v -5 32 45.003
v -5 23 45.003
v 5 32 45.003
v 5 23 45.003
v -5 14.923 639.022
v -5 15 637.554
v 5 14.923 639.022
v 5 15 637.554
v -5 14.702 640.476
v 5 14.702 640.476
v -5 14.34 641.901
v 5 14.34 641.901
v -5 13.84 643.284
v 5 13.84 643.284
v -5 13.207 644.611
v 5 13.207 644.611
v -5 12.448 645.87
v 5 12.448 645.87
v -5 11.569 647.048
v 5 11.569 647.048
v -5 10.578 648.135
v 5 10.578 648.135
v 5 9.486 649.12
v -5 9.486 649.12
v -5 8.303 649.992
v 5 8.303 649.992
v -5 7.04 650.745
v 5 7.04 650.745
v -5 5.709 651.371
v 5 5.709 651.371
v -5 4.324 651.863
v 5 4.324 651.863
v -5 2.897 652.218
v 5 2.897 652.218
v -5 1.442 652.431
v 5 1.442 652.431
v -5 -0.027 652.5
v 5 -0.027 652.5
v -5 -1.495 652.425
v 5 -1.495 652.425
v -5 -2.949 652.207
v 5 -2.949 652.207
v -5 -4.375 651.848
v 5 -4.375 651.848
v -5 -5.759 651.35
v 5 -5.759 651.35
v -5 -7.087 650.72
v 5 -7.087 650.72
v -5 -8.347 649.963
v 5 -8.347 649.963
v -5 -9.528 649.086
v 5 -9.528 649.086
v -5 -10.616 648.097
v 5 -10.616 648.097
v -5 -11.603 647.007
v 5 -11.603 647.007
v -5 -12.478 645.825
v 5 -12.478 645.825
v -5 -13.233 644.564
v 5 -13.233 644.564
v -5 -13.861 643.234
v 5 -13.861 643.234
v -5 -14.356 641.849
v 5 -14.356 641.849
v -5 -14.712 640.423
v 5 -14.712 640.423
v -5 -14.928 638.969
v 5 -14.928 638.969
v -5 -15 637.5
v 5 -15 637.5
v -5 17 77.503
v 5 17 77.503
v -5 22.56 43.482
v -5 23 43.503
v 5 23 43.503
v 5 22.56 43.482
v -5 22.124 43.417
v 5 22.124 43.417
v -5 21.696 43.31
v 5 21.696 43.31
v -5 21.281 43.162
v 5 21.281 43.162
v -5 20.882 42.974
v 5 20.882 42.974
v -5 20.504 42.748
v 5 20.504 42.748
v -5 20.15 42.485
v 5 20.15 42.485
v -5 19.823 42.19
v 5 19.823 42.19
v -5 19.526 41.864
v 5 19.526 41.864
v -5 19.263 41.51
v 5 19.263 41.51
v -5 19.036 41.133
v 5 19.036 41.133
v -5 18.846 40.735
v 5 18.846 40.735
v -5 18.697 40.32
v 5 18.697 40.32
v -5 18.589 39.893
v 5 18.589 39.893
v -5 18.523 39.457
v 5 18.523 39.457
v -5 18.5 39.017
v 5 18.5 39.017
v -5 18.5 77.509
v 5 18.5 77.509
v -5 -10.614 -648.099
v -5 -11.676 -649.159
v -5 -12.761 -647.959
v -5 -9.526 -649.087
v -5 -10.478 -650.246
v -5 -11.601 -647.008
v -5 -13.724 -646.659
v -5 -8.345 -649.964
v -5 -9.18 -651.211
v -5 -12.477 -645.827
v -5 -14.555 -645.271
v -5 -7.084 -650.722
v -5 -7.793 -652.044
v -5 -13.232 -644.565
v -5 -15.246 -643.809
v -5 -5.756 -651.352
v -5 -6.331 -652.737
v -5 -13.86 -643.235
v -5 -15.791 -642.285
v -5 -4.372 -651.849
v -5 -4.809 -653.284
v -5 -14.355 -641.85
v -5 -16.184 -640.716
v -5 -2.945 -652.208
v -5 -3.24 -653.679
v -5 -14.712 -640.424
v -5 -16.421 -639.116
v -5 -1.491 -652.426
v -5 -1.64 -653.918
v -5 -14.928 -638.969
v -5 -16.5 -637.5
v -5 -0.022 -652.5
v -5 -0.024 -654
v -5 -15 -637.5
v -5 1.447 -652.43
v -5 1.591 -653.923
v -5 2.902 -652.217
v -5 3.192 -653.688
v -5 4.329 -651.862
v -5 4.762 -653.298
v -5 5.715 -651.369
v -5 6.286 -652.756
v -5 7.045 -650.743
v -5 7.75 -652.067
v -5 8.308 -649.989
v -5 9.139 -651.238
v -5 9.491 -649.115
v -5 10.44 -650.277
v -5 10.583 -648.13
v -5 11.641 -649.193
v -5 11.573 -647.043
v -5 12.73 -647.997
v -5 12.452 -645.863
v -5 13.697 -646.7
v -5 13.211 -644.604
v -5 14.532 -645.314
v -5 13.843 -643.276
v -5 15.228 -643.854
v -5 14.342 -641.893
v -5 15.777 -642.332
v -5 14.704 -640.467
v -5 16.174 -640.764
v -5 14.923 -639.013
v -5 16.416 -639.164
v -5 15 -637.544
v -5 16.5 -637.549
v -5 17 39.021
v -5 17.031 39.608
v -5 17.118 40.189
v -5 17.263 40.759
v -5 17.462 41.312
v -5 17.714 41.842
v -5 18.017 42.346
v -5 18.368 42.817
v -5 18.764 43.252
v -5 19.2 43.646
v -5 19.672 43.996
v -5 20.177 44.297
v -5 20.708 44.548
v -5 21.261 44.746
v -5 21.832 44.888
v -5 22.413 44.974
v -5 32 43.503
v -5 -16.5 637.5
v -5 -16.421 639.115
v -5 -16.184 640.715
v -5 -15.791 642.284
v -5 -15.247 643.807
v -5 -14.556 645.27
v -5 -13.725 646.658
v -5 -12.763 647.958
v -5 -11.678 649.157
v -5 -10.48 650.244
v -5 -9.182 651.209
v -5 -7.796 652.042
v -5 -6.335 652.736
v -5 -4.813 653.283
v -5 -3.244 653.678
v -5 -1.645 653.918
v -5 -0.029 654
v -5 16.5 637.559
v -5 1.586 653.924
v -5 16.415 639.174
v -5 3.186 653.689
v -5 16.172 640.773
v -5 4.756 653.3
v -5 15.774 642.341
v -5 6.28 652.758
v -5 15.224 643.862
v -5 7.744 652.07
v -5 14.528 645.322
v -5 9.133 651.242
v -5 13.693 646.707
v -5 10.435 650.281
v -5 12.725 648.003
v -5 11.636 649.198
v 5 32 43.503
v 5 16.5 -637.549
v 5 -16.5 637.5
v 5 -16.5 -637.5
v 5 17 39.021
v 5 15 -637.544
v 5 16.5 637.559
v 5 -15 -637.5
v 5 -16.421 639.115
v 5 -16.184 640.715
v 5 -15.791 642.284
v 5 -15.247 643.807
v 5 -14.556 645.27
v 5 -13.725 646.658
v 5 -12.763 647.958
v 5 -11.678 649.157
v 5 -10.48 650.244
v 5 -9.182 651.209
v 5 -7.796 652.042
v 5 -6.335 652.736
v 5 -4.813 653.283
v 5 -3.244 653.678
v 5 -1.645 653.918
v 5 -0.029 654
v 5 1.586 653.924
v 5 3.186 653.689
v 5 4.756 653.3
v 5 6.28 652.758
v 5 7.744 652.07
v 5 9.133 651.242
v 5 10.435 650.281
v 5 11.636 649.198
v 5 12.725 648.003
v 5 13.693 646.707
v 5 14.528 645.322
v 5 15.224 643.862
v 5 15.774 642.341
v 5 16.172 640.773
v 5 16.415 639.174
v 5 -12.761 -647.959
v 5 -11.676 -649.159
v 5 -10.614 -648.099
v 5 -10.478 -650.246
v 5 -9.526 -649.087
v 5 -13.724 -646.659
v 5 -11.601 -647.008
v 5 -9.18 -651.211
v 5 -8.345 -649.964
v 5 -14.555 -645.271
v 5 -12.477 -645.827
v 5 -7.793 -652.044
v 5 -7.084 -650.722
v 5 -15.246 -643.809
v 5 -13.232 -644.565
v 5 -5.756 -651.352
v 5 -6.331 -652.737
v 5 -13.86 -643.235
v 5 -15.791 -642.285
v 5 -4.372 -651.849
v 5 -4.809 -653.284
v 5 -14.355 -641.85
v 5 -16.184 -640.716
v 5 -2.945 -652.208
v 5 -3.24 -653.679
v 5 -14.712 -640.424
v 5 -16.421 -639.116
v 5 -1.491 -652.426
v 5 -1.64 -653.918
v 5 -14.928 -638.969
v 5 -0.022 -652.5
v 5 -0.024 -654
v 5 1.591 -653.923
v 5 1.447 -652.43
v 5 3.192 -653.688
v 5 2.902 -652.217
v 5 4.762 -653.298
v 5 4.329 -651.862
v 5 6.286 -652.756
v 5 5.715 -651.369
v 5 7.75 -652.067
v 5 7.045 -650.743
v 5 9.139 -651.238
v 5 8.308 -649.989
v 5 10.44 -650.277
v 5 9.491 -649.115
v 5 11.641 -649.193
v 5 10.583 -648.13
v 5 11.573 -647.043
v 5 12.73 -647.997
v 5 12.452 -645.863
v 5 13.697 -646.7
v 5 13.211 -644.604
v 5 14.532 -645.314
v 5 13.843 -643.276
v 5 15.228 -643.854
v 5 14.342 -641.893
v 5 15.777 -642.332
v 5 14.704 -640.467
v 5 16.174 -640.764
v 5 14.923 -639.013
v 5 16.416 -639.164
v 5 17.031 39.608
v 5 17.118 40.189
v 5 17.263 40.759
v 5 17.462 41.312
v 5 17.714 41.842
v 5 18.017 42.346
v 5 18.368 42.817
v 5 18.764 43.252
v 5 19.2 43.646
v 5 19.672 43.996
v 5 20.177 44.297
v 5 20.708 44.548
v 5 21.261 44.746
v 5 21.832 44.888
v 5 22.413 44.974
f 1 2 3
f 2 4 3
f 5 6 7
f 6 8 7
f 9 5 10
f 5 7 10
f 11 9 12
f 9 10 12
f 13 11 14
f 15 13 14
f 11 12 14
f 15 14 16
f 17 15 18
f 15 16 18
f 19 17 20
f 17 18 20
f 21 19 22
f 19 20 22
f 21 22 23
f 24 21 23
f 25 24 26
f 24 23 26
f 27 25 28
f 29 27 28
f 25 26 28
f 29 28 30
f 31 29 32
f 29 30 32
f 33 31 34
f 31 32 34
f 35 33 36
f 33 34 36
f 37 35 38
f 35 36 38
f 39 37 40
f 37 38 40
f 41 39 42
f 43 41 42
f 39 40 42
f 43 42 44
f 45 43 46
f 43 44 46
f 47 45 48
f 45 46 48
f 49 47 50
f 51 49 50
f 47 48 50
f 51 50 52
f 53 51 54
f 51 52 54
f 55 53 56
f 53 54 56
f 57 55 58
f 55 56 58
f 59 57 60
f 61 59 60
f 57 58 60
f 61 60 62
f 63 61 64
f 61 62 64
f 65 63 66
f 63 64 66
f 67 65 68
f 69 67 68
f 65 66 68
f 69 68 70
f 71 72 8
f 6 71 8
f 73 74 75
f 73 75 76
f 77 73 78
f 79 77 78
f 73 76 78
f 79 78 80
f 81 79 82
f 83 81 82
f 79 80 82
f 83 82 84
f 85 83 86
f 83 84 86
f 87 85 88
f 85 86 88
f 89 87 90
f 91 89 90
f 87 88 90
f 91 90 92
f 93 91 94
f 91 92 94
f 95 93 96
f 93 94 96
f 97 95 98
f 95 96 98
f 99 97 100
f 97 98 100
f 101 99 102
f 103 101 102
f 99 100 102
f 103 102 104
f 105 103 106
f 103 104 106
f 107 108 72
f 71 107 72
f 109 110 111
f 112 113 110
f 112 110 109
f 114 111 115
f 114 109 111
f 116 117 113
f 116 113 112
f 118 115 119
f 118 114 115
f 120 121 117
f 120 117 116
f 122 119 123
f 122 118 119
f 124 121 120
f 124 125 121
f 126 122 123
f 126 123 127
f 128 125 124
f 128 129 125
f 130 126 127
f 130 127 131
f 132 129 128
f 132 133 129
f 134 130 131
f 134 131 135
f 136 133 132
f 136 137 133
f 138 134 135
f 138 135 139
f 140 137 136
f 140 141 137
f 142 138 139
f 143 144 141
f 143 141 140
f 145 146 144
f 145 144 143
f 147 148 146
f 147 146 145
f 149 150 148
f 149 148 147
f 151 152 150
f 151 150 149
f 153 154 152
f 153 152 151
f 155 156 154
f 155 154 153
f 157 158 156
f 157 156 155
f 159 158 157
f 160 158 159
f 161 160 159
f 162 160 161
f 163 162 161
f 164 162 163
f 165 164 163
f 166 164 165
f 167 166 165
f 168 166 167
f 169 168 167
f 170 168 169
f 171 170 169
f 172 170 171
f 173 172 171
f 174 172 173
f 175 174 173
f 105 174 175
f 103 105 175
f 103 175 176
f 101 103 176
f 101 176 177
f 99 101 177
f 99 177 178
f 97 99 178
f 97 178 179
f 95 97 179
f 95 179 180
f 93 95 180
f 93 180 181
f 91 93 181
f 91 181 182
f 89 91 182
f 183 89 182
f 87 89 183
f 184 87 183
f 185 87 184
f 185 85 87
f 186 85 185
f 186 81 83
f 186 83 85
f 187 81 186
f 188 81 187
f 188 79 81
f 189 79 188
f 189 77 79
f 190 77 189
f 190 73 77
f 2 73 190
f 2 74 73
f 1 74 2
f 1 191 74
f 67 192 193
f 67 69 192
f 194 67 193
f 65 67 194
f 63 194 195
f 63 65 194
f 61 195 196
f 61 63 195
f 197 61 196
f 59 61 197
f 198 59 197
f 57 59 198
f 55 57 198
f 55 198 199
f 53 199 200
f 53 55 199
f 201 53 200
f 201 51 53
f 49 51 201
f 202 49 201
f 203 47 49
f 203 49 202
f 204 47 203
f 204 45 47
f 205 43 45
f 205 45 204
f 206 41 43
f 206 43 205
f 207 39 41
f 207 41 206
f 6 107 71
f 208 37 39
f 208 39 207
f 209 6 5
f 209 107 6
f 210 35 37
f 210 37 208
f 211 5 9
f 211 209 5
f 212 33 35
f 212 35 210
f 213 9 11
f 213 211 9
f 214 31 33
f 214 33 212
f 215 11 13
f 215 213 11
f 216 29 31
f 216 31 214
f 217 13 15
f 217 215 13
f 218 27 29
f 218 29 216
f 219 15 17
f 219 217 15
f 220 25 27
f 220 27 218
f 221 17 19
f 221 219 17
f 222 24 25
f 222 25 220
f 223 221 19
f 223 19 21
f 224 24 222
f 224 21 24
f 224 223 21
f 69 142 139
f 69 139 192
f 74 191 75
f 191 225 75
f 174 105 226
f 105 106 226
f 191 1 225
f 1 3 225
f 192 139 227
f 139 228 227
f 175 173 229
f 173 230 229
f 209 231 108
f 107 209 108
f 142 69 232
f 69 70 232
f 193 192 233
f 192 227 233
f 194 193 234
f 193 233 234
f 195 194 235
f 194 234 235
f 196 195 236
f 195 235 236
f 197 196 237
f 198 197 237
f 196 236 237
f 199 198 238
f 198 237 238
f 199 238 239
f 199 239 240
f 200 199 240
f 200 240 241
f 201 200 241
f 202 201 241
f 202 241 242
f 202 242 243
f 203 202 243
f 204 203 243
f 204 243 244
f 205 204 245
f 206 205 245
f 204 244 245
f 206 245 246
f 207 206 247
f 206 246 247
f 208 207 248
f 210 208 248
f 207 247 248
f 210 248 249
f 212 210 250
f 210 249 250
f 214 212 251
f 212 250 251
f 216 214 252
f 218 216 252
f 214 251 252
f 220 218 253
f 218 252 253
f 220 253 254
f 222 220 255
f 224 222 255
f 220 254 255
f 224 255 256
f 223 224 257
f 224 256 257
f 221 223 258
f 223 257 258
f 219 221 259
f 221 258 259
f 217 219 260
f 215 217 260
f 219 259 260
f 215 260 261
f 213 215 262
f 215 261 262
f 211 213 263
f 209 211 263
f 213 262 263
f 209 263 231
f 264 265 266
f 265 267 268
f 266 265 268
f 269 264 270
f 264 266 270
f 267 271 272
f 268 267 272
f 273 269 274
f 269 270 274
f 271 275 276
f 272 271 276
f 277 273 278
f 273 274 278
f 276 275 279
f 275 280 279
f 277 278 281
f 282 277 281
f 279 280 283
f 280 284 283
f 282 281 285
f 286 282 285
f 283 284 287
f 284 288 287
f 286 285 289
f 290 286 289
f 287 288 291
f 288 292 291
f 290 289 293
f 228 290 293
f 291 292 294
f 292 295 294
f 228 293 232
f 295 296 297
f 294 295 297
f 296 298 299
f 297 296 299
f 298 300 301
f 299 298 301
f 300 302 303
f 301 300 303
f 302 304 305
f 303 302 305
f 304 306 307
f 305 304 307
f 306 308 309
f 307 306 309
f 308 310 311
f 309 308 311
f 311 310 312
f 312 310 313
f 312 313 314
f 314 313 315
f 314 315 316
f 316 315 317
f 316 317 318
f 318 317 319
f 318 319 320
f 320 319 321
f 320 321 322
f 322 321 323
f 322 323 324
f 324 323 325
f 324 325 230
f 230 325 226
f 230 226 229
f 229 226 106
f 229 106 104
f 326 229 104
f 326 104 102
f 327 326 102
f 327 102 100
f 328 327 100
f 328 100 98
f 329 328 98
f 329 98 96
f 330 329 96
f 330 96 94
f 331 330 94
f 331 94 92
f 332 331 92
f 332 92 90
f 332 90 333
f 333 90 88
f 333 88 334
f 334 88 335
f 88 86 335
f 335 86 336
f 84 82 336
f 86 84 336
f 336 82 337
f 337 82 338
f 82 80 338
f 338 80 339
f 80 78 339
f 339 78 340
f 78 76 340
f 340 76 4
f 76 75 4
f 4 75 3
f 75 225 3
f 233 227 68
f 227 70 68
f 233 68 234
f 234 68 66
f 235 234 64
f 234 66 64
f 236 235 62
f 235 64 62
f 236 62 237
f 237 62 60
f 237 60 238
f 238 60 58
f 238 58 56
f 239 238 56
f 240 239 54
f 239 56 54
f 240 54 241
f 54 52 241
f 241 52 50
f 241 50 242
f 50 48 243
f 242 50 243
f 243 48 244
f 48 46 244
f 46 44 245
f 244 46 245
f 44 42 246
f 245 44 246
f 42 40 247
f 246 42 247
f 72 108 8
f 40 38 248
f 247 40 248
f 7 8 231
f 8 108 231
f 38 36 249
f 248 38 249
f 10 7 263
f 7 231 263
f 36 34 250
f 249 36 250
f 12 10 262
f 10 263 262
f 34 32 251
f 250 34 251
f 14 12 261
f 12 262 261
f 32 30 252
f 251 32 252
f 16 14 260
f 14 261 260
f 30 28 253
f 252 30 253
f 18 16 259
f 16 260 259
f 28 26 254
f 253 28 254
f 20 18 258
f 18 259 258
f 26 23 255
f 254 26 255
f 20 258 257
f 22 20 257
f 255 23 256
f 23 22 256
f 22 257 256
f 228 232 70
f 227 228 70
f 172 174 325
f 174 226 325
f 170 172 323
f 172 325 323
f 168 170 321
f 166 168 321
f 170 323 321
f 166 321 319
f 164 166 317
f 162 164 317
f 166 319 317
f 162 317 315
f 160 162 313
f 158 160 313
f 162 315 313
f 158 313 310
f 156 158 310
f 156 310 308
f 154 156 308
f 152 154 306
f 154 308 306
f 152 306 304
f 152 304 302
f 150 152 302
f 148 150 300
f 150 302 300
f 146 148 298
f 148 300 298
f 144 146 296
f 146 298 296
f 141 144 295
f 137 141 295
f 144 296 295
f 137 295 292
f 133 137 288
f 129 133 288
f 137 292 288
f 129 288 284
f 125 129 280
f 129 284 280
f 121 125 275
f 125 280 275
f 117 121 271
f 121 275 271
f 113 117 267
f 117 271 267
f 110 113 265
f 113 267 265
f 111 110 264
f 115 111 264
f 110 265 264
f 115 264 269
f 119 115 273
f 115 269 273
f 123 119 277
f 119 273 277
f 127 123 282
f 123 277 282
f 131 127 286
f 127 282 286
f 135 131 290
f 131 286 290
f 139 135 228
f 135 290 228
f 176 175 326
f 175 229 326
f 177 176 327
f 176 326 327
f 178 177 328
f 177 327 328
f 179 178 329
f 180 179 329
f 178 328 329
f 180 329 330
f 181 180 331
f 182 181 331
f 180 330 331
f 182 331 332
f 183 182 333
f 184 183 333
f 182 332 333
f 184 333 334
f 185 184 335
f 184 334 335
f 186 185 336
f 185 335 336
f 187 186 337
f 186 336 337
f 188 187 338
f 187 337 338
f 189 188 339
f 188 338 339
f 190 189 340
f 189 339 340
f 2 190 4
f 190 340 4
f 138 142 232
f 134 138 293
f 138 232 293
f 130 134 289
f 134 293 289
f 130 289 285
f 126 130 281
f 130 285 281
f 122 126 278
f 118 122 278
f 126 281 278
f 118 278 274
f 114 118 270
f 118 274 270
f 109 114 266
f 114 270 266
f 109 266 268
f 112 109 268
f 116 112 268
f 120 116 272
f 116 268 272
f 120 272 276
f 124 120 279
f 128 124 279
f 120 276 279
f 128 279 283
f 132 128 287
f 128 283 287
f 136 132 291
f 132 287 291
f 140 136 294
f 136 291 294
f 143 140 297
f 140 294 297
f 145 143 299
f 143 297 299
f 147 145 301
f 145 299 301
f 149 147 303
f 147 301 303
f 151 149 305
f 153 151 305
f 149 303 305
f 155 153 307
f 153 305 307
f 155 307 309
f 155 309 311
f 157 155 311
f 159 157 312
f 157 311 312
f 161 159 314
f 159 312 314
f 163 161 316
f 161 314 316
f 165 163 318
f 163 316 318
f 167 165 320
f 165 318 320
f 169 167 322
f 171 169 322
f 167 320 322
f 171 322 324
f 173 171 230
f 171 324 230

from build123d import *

# Parameters (mm, degrees)
EXTRUDE_THIN1_DEPTH = 5


with BuildPart() as part:
    # Sketch1 → Extrude-Thin1 (new, symmetric)
    with BuildSketch(Plane(origin=(0, 0, 0), x_dir=(0, 0, -1), z_dir=(1, 0, 0))):
        with BuildLine():
            Line((-77.503218133, 17.000038263), (-637.553569857, 14.999904342))
            ThreePointArc((-637.553569857, 14.999904342), (-652.499976085, -0.026784971), (-637.5, -15))
            Line((-637.5, -15), (637.5, -15))
            ThreePointArc((637.5, -15), (652.499983614, -0.022171887), (637.544343726, 14.999934454))
            Line((637.544343726, 14.999934454), (-39.020955624, 17.000038263))
            ThreePointArc((-39.020955624, 17.000038263), (-43.252125342, 18.763647149), (-45.003218133, 23.000012045))
            Line((-45.003218133, 23.000012045), (-45.003218133, 32.000038263))
            Line((-45.003218133, 32.000038263), (-43.503218133, 32.000038263))
            Line((-43.503218133, 32.000038263), (-43.503218133, 23.000012045))
            ThreePointArc((-43.503218133, 23.000012045), (-42.18989854, 19.822738373), (-39.016521251, 18.500031709))
            Line((-39.016521251, 18.500031709), (637.548778098, 16.4999279))
            ThreePointArc((637.548778098, 16.4999279), (653.999981975, -0.024389076), (637.5, -16.5))
            Line((637.5, -16.5), (-637.5, -16.5))
            ThreePointArc((-637.5, -16.5), (-653.999973694, -0.029463469), (-637.558926843, 16.499894776))
            Line((-637.558926843, 16.499894776), (-77.508575119, 18.500028697))
            Line((-77.508575119, 18.500028697), (-77.503218133, 17.000038263))
        make_face()
    extrude(amount=EXTRUDE_THIN1_DEPTH, both=True)


solid = part.part
